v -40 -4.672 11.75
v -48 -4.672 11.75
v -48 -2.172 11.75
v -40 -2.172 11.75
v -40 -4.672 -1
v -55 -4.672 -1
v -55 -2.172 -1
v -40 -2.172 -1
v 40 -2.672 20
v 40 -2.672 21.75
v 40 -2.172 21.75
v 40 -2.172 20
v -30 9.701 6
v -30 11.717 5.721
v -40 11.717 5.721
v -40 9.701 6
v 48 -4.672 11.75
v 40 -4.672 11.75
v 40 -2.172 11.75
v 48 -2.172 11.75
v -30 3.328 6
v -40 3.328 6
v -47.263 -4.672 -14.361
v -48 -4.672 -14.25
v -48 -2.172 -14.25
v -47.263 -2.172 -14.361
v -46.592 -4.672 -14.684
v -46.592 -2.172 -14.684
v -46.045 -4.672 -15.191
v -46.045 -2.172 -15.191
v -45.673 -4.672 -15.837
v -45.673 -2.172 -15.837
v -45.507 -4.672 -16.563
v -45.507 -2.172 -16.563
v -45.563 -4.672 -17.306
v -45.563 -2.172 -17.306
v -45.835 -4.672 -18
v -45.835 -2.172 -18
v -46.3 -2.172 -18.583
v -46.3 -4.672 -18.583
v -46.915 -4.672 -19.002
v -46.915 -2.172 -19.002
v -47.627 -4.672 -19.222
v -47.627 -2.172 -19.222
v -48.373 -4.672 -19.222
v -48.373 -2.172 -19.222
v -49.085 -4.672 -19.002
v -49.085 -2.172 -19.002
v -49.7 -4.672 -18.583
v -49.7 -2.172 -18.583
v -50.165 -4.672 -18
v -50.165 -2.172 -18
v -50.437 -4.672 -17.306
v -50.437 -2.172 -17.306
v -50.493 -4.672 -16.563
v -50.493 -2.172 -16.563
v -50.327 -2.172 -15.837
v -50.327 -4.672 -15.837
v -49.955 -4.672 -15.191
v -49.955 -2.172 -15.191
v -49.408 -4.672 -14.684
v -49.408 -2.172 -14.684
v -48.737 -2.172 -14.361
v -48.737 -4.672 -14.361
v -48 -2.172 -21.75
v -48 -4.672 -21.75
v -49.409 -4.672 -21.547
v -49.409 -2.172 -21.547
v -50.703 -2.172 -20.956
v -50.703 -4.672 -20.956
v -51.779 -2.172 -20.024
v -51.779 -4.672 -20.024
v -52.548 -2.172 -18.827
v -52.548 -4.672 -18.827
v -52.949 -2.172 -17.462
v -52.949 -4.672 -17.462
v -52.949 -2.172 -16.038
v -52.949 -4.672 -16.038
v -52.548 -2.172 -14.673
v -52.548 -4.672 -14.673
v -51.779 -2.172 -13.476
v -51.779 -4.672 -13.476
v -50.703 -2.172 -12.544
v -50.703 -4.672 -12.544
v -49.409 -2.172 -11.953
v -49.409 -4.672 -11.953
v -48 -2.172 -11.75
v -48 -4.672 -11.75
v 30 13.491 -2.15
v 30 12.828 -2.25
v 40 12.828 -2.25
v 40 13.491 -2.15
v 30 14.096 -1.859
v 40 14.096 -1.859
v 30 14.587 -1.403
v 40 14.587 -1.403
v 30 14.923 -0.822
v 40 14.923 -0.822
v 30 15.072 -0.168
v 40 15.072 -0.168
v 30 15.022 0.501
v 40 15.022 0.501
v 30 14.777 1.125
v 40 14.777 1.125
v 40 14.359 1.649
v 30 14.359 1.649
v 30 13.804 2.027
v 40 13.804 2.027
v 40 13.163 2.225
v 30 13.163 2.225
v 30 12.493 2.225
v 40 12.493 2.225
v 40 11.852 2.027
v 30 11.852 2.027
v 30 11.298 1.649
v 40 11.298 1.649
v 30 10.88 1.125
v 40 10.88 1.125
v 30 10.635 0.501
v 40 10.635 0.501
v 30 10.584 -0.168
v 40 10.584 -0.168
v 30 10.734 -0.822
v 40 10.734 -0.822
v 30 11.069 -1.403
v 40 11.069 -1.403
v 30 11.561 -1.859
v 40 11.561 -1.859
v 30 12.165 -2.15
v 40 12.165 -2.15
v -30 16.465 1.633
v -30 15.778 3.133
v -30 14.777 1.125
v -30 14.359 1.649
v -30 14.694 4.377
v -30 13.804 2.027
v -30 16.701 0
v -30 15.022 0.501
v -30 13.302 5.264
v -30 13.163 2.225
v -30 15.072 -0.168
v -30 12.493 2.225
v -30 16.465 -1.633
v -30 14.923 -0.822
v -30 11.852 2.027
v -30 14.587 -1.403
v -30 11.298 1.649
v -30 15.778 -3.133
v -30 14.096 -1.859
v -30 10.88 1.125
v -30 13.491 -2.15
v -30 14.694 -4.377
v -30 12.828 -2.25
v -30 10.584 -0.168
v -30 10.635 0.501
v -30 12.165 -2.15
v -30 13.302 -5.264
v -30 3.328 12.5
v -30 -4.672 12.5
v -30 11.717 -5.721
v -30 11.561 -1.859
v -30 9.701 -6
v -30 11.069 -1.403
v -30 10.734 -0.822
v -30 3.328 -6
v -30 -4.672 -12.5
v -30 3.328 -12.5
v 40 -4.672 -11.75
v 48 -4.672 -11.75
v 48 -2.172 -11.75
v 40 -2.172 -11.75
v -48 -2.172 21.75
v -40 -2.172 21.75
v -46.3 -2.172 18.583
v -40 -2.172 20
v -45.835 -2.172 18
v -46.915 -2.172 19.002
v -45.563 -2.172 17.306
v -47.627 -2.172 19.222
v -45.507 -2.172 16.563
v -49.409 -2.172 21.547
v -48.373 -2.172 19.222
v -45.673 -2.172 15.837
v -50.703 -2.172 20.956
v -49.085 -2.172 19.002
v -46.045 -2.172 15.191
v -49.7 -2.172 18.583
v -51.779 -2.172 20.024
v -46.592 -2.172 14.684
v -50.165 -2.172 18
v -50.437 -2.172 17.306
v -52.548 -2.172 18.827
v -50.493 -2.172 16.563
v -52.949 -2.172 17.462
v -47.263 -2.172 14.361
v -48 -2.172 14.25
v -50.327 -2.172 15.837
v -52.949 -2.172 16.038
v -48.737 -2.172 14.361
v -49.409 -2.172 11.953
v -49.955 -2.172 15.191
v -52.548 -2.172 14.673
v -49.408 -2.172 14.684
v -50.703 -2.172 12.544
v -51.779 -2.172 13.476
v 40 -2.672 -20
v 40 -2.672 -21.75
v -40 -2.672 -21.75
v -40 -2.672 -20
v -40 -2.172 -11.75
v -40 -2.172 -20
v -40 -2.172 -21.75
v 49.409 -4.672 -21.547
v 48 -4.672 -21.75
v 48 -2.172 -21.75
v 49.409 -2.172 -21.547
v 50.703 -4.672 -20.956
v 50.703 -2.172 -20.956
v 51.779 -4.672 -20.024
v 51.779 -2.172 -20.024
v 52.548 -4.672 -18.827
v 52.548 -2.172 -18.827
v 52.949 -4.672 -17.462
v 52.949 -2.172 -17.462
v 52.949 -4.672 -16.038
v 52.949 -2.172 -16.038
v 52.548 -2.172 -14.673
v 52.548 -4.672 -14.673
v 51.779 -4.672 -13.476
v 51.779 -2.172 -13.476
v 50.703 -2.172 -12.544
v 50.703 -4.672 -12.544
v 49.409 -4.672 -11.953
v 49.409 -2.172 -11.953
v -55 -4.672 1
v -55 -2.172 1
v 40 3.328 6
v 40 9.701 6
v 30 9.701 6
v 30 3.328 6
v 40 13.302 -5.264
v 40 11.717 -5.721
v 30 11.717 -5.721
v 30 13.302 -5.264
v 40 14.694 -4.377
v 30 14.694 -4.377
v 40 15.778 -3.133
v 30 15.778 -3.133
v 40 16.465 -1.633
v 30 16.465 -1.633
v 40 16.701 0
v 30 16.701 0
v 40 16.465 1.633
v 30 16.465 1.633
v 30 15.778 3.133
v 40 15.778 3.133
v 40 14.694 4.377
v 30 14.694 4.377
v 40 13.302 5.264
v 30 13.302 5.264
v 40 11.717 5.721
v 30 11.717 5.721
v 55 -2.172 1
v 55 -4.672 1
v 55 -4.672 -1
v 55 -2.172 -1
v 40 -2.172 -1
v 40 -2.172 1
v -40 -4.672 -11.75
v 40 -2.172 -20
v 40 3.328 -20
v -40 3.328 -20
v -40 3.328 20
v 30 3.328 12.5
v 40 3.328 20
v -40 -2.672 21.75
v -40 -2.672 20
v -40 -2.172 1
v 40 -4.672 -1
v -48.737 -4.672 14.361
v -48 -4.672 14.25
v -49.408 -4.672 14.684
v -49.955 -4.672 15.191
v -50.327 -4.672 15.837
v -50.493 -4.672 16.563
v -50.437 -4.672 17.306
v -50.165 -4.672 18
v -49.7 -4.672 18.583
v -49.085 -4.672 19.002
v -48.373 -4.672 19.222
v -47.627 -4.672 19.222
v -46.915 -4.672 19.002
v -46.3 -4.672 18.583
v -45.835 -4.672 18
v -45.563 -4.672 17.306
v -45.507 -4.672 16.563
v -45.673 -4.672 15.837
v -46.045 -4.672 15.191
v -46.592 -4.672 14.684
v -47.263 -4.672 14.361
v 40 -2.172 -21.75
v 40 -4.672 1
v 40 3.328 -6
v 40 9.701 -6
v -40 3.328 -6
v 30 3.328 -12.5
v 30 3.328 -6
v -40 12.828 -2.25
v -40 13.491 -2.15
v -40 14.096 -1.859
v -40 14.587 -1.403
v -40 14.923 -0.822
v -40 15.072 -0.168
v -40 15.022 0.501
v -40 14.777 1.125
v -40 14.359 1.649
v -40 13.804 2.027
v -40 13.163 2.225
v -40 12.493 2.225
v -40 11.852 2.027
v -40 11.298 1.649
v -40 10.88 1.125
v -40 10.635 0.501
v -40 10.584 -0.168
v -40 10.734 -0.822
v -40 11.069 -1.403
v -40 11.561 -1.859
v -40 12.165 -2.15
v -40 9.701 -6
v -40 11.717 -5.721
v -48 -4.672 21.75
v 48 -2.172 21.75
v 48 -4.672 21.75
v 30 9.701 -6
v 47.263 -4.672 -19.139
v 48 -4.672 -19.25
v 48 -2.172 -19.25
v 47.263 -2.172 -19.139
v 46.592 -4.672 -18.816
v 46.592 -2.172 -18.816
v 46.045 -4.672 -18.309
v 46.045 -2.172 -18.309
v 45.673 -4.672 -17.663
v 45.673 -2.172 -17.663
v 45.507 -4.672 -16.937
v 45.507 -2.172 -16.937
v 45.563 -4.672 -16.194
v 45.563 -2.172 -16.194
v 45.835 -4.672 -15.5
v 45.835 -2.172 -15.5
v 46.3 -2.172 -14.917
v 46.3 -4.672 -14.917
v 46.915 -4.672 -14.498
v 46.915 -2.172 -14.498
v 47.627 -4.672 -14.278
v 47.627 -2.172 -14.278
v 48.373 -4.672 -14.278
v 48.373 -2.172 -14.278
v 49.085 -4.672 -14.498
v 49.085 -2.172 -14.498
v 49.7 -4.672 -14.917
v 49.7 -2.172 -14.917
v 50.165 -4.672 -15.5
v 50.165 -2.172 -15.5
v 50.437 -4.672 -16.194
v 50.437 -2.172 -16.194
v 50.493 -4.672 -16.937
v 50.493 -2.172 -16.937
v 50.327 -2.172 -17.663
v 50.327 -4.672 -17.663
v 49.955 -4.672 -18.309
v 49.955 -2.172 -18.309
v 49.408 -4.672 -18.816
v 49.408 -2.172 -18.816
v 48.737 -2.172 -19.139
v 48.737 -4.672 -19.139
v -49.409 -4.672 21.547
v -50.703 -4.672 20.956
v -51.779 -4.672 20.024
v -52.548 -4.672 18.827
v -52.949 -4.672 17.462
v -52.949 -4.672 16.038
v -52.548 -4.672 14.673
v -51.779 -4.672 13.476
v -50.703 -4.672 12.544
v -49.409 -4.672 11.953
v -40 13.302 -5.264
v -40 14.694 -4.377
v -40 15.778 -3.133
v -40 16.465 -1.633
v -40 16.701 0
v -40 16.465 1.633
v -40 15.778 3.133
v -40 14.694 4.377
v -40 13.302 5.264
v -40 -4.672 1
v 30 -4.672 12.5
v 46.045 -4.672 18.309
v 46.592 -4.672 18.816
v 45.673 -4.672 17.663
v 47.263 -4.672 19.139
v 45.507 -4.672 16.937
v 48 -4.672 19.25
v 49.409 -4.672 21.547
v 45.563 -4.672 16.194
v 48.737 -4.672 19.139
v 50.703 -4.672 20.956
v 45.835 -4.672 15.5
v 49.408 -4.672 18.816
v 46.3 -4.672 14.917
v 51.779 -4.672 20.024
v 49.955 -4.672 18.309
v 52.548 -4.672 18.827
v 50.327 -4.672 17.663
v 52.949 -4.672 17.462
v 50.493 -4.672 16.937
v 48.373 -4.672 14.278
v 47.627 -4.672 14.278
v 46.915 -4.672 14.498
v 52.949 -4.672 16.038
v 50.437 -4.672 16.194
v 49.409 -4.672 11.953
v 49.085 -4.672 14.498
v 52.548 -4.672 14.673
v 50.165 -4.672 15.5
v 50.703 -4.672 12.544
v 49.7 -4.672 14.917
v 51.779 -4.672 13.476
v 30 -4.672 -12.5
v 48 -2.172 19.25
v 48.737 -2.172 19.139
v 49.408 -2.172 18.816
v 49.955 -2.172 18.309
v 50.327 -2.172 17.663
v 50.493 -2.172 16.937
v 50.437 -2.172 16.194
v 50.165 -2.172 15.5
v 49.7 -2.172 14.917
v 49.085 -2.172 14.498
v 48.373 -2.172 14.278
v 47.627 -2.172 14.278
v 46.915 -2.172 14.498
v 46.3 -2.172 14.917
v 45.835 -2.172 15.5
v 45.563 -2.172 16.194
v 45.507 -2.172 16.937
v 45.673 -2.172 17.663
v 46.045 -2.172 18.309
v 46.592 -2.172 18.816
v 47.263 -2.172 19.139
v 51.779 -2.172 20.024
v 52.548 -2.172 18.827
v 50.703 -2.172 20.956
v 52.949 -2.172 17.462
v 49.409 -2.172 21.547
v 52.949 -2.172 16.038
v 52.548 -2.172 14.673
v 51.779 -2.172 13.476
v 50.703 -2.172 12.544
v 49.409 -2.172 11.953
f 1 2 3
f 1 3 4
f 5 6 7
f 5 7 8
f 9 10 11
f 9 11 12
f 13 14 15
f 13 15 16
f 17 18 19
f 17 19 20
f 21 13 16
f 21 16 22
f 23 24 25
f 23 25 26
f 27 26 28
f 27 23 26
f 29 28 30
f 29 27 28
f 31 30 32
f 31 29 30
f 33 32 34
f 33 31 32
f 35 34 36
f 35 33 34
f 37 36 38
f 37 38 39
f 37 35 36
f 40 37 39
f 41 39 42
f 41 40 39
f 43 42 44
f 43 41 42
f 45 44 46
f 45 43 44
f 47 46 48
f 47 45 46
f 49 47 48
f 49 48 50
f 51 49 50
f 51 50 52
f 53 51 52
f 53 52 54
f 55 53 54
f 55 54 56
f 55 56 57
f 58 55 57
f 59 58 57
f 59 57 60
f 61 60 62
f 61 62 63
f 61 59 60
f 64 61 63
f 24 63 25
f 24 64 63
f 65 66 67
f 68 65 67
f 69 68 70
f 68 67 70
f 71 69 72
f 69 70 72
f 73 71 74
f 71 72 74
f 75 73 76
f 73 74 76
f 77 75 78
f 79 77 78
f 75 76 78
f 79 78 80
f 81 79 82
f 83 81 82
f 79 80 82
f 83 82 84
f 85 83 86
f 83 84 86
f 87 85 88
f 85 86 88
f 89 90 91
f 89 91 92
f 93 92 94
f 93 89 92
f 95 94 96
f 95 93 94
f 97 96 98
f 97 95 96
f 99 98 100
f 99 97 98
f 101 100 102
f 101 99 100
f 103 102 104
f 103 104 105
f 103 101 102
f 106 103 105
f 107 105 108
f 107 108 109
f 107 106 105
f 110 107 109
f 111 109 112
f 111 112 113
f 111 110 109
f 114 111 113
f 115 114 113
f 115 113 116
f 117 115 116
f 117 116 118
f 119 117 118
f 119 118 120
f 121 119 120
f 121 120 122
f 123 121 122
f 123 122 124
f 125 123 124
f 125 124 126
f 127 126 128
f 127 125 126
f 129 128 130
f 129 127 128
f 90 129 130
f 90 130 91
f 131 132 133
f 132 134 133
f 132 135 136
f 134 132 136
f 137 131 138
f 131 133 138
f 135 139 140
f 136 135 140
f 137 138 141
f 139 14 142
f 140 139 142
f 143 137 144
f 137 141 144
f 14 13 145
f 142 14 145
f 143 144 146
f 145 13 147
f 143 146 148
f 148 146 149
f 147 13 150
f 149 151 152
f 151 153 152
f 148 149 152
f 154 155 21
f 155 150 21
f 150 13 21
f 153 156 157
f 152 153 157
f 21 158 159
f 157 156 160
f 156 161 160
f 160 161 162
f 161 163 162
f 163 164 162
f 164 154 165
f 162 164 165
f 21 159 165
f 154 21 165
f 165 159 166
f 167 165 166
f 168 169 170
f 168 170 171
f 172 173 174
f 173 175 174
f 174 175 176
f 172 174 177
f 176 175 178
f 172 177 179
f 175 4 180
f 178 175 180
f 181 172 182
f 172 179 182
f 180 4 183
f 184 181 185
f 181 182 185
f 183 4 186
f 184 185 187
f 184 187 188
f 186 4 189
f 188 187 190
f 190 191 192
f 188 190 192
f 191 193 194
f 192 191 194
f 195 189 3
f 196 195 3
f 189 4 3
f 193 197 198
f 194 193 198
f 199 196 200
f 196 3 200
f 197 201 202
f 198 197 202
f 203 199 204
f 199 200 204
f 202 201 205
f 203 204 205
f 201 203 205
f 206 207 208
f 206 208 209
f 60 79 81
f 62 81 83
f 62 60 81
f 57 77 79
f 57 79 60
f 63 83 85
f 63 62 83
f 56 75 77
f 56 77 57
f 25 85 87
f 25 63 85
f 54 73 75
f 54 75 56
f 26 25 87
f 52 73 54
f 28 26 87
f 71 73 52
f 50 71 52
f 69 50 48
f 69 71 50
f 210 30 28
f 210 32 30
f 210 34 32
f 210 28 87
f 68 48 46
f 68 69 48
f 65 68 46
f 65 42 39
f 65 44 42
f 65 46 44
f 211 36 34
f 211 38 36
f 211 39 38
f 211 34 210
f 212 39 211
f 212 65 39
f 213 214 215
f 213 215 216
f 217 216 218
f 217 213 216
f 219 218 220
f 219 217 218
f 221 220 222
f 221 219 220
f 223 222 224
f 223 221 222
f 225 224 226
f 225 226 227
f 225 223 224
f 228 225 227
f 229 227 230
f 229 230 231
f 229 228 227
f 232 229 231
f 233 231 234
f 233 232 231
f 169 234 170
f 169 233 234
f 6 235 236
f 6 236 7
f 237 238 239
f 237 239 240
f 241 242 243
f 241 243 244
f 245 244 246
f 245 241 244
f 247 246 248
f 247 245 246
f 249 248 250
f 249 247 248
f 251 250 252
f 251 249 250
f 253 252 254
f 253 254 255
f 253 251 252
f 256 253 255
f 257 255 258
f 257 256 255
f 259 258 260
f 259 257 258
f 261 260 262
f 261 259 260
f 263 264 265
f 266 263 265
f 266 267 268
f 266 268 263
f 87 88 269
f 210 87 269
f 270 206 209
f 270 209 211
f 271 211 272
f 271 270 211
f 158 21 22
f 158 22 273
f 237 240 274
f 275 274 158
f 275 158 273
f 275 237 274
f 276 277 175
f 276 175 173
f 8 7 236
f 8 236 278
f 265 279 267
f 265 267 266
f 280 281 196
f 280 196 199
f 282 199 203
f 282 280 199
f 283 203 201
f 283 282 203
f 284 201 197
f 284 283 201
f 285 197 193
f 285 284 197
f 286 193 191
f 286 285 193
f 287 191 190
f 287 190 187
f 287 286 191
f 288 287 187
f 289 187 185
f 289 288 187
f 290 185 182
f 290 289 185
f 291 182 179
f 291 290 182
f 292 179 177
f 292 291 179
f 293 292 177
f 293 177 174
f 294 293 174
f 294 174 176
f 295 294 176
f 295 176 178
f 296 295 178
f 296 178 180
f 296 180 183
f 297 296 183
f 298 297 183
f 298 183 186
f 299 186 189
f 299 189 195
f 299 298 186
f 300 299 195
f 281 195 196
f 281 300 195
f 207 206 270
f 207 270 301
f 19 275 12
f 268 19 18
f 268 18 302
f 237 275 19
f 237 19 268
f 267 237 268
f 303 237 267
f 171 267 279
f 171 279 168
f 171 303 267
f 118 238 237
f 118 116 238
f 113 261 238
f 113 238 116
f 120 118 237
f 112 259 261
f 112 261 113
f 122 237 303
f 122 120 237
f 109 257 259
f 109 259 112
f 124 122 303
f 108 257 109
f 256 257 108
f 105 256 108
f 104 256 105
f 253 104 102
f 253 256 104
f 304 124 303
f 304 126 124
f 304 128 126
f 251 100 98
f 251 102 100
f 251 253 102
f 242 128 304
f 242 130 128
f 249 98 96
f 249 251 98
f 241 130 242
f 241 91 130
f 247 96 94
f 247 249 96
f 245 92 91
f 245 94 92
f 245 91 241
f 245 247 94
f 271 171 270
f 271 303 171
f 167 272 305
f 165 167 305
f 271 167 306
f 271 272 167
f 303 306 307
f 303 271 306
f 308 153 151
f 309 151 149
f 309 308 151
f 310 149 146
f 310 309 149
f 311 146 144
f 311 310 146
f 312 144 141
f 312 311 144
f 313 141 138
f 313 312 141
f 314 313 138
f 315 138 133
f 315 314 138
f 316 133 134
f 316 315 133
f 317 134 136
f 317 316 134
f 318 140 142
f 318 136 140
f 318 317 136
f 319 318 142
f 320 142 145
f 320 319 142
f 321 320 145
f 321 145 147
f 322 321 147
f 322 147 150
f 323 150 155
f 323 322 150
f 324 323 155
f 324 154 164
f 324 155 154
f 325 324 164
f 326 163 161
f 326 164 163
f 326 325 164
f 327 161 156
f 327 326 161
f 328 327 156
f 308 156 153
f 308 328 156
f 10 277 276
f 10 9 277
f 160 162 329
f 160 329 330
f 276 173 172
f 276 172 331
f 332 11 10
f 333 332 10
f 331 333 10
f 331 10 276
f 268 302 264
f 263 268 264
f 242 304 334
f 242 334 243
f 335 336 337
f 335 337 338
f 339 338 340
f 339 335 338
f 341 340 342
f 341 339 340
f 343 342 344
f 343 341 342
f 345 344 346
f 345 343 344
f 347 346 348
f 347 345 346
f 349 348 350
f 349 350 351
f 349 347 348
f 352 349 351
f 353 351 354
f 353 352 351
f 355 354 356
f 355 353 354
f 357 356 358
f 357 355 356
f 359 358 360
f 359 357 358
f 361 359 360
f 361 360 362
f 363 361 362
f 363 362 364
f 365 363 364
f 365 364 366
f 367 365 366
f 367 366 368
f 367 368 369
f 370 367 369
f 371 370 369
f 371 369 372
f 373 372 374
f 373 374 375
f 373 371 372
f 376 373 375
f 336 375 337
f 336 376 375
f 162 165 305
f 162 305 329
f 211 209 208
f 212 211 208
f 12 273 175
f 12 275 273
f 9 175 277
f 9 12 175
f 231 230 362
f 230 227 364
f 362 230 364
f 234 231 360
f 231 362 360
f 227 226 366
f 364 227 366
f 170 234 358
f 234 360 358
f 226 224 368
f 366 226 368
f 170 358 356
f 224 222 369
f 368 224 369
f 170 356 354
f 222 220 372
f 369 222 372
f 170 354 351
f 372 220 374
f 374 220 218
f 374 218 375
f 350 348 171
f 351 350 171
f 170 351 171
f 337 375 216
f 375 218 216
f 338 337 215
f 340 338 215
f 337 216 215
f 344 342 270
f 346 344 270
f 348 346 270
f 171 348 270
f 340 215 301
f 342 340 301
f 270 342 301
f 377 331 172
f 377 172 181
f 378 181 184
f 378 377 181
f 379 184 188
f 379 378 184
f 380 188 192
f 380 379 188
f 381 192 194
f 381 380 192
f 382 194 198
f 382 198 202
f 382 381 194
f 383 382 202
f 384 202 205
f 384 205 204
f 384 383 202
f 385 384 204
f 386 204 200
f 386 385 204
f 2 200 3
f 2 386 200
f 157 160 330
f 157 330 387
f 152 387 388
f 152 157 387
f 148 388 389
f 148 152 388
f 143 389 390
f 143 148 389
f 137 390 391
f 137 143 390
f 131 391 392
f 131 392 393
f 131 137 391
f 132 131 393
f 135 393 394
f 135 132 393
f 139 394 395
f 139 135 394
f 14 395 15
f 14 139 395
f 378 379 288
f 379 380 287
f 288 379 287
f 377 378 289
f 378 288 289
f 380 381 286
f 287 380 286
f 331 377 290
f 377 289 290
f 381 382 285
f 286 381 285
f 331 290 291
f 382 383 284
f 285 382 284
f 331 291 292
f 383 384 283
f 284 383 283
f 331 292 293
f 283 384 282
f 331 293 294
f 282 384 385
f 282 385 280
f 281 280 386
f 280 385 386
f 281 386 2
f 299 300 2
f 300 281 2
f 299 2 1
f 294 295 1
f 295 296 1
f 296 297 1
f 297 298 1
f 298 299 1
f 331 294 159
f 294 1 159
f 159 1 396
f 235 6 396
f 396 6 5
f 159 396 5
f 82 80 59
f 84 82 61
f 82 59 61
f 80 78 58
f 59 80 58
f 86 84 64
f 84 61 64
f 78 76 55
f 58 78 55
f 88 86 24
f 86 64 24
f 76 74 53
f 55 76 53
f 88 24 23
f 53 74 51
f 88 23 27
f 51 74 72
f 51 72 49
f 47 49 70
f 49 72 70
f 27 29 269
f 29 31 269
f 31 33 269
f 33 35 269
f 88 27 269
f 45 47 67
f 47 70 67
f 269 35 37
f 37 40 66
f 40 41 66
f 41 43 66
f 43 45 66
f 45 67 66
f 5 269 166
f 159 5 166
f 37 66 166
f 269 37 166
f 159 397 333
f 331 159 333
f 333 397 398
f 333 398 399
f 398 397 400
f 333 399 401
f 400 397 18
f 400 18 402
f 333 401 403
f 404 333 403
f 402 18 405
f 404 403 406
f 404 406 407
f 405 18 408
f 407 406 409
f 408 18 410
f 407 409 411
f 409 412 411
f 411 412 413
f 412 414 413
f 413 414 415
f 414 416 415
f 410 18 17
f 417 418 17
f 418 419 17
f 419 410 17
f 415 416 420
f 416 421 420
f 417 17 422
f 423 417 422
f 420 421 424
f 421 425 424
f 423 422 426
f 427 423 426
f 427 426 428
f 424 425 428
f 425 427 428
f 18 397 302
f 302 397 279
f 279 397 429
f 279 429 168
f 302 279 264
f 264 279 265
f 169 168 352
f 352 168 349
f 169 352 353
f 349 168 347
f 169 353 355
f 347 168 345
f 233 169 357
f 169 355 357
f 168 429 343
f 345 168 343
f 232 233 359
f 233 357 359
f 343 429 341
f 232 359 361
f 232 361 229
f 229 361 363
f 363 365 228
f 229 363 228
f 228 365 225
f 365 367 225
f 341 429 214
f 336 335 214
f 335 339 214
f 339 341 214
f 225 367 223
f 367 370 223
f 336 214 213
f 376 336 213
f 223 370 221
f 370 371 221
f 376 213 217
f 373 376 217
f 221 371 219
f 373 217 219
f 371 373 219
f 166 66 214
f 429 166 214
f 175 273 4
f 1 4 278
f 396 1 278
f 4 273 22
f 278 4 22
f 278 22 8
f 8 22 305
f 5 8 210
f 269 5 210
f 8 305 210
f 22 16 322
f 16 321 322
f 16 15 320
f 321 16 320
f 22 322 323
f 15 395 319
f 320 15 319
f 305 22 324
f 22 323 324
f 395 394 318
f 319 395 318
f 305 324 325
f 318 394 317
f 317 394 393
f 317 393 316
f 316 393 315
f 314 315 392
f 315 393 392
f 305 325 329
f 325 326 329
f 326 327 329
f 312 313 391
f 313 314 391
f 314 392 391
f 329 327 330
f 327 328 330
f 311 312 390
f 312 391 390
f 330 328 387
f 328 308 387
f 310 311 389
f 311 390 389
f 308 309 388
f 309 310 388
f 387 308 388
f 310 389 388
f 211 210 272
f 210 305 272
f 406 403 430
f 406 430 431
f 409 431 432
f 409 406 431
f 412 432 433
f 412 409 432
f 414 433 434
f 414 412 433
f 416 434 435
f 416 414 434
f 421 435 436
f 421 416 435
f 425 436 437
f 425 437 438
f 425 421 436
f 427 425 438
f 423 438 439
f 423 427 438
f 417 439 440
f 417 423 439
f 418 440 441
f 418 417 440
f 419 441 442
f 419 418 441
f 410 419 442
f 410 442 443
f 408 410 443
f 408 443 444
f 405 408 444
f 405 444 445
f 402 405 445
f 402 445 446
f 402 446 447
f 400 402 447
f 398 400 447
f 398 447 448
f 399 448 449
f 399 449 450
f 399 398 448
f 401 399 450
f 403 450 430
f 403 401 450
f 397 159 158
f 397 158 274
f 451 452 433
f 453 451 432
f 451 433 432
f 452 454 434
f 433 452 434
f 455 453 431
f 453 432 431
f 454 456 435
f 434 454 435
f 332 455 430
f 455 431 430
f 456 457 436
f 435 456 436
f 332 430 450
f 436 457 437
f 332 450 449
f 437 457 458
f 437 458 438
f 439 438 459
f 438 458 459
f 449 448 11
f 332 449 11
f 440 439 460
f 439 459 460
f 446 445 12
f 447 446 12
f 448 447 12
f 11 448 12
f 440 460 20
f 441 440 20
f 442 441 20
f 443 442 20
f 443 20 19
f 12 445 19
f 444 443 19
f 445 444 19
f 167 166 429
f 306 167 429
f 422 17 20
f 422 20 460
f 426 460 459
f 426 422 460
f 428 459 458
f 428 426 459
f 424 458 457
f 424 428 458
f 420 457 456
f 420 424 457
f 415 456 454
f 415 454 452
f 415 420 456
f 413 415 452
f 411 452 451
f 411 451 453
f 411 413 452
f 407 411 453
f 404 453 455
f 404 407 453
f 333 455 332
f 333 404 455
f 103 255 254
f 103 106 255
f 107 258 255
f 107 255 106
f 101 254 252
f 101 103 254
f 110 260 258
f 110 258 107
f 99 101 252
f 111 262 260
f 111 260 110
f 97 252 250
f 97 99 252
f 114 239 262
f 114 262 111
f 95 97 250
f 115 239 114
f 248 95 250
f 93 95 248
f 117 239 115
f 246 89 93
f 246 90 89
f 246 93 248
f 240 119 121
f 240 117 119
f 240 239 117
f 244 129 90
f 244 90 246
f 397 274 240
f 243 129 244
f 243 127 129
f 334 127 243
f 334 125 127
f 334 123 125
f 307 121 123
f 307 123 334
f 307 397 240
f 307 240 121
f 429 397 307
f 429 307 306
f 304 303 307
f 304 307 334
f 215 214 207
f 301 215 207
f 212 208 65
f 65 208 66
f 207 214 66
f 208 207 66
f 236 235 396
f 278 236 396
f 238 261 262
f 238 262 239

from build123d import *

# Parameters (mm, degrees)
SKETCH1_R               = 2.25
BOSS_EXTRUDE1_DEPTH     = 40
SKETCH3_R               = 2.5
SKETCH3_W               = 15
SKETCH3_H               = 2
BOSS_EXTRUDE2_DEPTH     = 2.5
CUT_EXTRUDE2_DEPTH      = 60
CUT_EXTRUDE2_DEPTH_BACK = 60
SKETCH2_W               = 60
SKETCH2_H               = 25


with BuildPart() as part:
    # Sketch1 → Boss-Extrude1 (new, symmetric)
    with BuildSketch(Plane(origin=(0, 0, 0), x_dir=(0, 0, -1), z_dir=(1, 0, 0))):
        with BuildLine():
            Line((-20, -2.671875), (-21.75, -2.671875))
            Line((-21.75, -2.671875), (-21.75, -4.671875))
            Line((-21.75, -4.671875), (21.75, -4.671875))
            Line((21.75, -4.671875), (21.75, -2.671875))
            Line((21.75, -2.671875), (20, -2.671875))
            Line((20, -2.671875), (20, 3.328125))
            Line((20, 3.328125), (10.652726064, 3.328125))
            Line((10.652726064, 3.328125), (6, 3.328125))
            Line((6, 3.328125), (6, 9.701246493))
            Line((6, 9.701246493), (5.721159773, 11.716861618))
            ThreePointArc((5.721159773, 11.716861618), (0, 16.70104227), (-5.721159773, 11.716861618))
            Line((-5.721159773, 11.716861618), (-6, 9.701246493))
            Line((-6, 9.701246493), (-6, 3.328125))
            Line((-6, 3.328125), (-10.652726064, 3.328125))
            Line((-10.652726064, 3.328125), (-20, 3.328125))
            Line((-20, 3.328125), (-20, -2.671875))
        make_face()
        with Locations((0, 12.828125)):
            Circle(SKETCH1_R, mode=Mode.SUBTRACT)
    extrude(amount=BOSS_EXTRUDE1_DEPTH, both=True)

    # Sketch3 → Boss-Extrude2 (add)
    # profile 1 of 6: a face of its own
    with BuildSketch(Plane(origin=(0, -4.671875, 0), x_dir=(1, 0, 0), z_dir=(0, 1, 0))):
        with BuildLine():
            Line((-40, 21.75), (-48, 21.75))
            ThreePointArc((-48, 21.75), (-53, 16.75), (-48, 11.75))
            Line((-48, 11.75), (-40, 11.75))
            Line((-40, 11.75), (-40, 21.75))
        make_face()
        with Locations(Location((-48, 16.75, 0), (0, 0, 270))):
            Circle(SKETCH3_R, mode=Mode.SUBTRACT)
    # profile 2 of 6: a face of its own
    with BuildSketch(Plane(origin=(0, -4.671875, 0), x_dir=(1, 0, 0), z_dir=(0, 1, 0))):
        with BuildLine():
            Line((40, 21.75), (48, 21.75))
            ThreePointArc((48, 21.75), (53, 16.75), (48, 11.75))
            Line((48, 11.75), (40, 11.75))
            Line((40, 11.75), (40, 21.75))
        make_face()
        with Locations(Location((48, 16.75, 0), (0, 0, 90))):
            Circle(SKETCH3_R, mode=Mode.SUBTRACT)
    # profile 3 of 6: a face of its own
    with BuildSketch(Plane(origin=(0, -4.671875, 0), x_dir=(1, 0, 0), z_dir=(0, 1, 0))):
        with BuildLine():
            Line((40, -21.75), (40, -11.75))
            Line((40, -11.75), (48, -11.75))
            ThreePointArc((48, -11.75), (53, -16.75), (48, -21.75))
            Line((48, -21.75), (40, -21.75))
        make_face()
        with Locations(Location((48, -16.75, 0), (0, 0, 270))):
            Circle(SKETCH3_R, mode=Mode.SUBTRACT)
    # profile 4 of 6: a face of its own
    with BuildSketch(Plane(origin=(0, -4.671875, 0), x_dir=(1, 0, 0), z_dir=(0, 1, 0))):
        with BuildLine():
            Line((-40, -21.75), (-48, -21.75))
            ThreePointArc((-48, -21.75), (-53, -16.75), (-48, -11.75))
            Line((-48, -11.75), (-40, -11.75))
            Line((-40, -11.75), (-40, -21.75))
        make_face()
        with Locations(Location((-48, -16.75, 0), (0, 0, 90))):
            Circle(SKETCH3_R, mode=Mode.SUBTRACT)
    # profile 5 of 6: a face of its own
    with BuildSketch(Plane(origin=(0, -4.671875, 0), x_dir=(1, 0, 0), z_dir=(0, 1, 0))):
        with Locations((-47.5, 0)):
            Rectangle(SKETCH3_W, SKETCH3_H)
    # profile 6 of 6: a face of its own
    with BuildSketch(Plane(origin=(0, -4.671875, 0), x_dir=(1, 0, 0), z_dir=(0, 1, 0))):
        with Locations((47.5, 0)):
            Rectangle(SKETCH3_W, SKETCH3_H)
    extrude(amount=BOSS_EXTRUDE2_DEPTH)

    # Sketch2 → Cut-Extrude2 (cut, two sides: drawn at the far end of the back side and taken through both)
    with BuildSketch(Plane(origin=(0, -2.671875, 0), x_dir=(1, 0, 0), z_dir=(0, 1, 0)).offset(-CUT_EXTRUDE2_DEPTH_BACK)):
        Rectangle(SKETCH2_W, SKETCH2_H)
    extrude(amount=CUT_EXTRUDE2_DEPTH + CUT_EXTRUDE2_DEPTH_BACK, mode=Mode.SUBTRACT)


solid = part.part
